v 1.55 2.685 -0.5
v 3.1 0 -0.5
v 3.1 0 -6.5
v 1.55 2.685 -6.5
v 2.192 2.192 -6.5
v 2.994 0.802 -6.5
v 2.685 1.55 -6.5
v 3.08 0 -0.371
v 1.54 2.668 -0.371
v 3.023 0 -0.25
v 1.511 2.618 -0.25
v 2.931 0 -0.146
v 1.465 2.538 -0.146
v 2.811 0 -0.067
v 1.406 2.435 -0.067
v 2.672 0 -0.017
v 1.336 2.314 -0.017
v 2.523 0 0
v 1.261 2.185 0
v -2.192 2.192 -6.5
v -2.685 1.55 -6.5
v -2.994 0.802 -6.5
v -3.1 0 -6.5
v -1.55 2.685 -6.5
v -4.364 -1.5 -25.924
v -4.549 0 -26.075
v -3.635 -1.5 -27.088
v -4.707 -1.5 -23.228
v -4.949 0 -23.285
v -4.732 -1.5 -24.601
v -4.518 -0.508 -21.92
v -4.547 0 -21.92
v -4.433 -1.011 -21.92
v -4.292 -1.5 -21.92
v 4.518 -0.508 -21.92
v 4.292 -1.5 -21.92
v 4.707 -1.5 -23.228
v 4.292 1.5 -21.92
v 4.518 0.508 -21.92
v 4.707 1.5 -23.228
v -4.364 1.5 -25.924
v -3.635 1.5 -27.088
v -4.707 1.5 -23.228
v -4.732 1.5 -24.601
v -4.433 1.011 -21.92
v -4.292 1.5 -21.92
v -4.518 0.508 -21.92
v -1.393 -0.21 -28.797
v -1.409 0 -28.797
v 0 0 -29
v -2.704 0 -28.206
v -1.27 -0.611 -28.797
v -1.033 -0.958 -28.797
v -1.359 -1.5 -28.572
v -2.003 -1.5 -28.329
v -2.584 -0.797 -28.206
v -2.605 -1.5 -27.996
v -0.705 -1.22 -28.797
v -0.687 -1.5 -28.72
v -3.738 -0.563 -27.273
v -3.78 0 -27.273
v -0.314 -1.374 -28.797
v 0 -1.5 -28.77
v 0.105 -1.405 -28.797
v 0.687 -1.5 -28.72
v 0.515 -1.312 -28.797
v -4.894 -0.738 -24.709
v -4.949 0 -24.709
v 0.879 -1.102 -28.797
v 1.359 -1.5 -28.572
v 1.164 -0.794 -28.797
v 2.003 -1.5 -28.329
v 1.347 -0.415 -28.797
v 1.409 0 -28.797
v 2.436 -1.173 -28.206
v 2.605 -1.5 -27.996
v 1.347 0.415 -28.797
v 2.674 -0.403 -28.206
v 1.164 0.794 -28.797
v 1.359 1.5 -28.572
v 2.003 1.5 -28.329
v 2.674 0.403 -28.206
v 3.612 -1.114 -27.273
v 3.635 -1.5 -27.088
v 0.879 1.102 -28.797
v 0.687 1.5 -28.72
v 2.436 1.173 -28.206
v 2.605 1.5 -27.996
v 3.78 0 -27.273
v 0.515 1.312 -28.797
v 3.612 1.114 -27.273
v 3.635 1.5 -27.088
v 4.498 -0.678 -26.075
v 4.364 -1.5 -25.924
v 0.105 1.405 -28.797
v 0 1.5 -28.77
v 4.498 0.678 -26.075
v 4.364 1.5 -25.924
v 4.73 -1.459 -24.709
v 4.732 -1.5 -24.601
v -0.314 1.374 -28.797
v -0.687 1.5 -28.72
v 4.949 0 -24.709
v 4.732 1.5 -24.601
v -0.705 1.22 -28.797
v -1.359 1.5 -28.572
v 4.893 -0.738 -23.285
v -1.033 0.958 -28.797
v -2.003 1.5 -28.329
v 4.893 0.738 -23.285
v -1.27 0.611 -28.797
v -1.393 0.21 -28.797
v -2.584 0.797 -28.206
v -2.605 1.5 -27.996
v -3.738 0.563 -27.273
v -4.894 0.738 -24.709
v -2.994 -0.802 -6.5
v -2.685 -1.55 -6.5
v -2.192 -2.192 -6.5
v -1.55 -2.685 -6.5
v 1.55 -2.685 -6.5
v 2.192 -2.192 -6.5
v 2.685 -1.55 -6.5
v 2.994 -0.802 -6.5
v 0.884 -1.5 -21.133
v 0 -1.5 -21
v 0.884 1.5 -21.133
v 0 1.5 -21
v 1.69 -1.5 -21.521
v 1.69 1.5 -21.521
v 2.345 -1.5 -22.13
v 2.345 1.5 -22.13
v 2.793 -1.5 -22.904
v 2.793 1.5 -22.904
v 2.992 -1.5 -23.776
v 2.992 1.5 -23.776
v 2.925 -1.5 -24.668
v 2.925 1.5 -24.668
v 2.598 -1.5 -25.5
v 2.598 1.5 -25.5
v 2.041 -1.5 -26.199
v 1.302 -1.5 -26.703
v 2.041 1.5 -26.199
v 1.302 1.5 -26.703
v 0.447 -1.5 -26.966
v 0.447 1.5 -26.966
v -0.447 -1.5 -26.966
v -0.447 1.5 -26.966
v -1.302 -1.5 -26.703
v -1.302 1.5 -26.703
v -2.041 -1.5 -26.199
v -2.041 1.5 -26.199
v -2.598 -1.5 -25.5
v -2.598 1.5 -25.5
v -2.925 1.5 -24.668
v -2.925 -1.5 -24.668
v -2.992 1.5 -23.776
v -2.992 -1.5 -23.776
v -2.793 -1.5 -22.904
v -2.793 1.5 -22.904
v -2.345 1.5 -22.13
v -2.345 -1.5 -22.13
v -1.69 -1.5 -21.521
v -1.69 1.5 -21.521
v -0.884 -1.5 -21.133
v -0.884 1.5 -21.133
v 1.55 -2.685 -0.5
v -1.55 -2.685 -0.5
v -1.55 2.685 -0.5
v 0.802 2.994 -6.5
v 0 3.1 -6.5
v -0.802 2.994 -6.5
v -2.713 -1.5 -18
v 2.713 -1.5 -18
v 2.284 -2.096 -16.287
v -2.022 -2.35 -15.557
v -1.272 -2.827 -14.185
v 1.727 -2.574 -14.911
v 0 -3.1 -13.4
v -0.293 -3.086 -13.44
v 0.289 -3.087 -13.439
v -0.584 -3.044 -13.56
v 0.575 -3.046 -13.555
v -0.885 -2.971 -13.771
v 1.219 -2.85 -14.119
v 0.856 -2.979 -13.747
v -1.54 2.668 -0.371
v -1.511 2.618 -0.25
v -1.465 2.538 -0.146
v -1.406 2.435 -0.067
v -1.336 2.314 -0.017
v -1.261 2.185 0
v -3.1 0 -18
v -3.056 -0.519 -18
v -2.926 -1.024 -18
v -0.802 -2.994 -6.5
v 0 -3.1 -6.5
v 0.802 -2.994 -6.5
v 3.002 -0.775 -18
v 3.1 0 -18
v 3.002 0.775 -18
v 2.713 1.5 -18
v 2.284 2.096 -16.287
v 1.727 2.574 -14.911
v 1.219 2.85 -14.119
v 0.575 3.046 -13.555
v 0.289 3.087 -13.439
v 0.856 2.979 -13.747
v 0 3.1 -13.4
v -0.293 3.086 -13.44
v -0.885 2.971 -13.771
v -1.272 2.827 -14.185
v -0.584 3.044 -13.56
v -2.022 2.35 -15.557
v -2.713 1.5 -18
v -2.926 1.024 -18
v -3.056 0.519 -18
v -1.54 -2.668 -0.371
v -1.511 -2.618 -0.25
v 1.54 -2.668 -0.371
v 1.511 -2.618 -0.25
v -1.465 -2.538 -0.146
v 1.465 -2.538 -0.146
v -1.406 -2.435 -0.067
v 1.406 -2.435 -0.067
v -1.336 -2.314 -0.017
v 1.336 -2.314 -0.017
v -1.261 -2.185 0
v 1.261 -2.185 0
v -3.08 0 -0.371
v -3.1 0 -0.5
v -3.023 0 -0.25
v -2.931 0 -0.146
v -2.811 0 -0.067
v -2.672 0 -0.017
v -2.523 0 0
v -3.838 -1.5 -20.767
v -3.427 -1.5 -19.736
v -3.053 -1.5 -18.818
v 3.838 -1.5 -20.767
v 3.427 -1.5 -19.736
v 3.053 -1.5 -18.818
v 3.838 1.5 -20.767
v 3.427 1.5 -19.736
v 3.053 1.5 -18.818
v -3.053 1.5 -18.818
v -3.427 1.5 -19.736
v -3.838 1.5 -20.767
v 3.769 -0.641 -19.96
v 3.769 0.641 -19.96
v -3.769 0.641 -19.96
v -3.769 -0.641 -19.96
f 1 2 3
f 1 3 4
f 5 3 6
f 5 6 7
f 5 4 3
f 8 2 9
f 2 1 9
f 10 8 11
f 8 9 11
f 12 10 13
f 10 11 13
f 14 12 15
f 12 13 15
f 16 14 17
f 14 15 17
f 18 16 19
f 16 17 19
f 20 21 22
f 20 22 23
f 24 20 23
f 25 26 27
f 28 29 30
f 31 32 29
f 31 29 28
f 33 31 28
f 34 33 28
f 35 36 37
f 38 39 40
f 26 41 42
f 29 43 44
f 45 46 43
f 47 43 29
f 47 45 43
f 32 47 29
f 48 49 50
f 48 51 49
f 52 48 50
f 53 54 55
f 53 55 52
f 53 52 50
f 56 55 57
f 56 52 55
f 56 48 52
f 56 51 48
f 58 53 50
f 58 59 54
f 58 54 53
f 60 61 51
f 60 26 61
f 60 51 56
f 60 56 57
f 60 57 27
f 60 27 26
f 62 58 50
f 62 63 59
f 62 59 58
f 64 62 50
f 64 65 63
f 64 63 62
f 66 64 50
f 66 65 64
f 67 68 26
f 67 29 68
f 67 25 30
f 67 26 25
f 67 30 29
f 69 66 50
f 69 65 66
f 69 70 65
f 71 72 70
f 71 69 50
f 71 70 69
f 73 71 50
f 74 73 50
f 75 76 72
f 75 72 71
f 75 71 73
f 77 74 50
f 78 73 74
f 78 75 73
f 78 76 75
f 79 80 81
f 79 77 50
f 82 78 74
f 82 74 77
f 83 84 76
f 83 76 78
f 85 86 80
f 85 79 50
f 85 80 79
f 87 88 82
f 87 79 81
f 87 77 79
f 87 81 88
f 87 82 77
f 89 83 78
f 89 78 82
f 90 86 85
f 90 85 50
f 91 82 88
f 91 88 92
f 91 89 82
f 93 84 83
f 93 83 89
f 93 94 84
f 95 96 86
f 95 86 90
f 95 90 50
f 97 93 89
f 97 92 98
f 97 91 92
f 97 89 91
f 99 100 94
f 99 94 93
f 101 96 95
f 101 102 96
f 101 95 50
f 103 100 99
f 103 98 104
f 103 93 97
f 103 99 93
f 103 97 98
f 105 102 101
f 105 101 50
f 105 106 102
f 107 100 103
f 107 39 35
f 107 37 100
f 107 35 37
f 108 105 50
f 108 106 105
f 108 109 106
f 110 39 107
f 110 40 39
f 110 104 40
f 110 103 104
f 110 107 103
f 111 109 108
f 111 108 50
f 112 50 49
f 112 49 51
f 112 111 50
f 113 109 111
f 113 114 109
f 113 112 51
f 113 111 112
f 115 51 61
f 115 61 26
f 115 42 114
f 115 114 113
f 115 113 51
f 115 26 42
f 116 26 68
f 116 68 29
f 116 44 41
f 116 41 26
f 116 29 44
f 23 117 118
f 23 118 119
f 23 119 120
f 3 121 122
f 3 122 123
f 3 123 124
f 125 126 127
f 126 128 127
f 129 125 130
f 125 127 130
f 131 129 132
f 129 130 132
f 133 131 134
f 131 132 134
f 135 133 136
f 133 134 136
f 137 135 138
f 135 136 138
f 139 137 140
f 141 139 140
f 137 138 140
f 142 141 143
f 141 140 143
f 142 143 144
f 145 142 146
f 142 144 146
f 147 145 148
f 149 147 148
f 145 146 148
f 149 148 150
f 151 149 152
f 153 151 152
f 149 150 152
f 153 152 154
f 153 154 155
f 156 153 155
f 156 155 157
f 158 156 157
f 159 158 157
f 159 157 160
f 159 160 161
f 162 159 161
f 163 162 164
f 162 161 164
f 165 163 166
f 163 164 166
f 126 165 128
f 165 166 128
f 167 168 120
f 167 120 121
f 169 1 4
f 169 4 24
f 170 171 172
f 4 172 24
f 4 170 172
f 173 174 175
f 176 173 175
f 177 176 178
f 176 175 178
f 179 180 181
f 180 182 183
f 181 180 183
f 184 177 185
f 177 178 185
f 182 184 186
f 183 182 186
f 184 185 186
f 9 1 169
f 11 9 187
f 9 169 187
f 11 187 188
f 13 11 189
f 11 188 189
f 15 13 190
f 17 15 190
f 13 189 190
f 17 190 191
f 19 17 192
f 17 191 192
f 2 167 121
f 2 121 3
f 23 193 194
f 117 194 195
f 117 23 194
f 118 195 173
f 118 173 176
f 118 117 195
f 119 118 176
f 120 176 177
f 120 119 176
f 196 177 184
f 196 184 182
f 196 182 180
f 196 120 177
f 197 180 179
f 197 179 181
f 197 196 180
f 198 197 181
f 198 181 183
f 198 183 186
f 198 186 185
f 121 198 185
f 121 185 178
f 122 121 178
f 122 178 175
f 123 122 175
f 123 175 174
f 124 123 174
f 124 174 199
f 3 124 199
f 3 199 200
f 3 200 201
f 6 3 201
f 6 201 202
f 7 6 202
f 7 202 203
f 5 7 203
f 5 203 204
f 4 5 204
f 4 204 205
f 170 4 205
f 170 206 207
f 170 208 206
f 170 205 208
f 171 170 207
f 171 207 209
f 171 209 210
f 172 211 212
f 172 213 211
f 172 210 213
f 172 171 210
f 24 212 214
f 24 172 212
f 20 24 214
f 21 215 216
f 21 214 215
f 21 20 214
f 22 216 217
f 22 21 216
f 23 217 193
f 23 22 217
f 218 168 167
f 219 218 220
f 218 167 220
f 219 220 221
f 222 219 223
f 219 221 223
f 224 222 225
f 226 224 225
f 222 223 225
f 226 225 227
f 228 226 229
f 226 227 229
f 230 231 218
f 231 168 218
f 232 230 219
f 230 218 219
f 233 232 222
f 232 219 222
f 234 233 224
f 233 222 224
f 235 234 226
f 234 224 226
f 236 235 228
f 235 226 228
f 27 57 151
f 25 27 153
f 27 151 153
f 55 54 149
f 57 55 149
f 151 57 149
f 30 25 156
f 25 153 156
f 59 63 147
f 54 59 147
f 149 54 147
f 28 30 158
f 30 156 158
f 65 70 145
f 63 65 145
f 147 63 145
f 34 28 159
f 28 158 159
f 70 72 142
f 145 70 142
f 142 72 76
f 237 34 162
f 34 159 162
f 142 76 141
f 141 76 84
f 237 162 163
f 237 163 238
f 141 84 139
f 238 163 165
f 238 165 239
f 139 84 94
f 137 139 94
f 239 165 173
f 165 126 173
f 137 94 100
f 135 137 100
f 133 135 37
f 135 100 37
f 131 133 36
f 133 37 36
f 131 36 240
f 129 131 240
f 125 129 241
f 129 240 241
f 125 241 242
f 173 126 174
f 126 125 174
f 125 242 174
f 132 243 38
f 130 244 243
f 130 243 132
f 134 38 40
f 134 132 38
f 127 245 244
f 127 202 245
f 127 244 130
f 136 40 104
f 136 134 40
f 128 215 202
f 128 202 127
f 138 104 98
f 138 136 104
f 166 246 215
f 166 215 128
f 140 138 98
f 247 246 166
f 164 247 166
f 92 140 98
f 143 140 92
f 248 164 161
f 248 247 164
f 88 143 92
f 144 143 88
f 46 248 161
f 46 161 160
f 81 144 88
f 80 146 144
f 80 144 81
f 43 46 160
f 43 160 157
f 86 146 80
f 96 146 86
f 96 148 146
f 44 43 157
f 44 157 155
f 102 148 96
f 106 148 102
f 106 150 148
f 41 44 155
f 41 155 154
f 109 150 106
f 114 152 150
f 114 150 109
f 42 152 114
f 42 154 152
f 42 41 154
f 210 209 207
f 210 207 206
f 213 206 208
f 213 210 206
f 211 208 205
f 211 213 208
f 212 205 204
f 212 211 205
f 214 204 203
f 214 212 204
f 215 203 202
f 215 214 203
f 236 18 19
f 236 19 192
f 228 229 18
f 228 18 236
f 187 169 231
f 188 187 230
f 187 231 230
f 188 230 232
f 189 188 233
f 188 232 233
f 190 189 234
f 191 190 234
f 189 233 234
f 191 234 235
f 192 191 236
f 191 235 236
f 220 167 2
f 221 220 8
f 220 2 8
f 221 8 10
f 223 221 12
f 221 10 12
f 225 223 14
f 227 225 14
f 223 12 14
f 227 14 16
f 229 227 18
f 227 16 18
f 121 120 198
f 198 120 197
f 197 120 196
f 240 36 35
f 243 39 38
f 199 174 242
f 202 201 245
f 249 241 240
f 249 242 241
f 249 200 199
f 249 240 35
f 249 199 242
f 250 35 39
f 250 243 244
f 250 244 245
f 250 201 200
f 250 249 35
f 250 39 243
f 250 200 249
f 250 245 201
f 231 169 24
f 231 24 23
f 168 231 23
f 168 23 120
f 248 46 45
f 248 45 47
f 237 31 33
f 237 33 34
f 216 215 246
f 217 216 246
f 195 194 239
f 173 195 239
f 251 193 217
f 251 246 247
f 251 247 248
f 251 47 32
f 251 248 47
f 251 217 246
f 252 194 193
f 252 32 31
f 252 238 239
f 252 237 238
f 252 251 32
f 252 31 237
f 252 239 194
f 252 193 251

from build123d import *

# Parameters (mm, degrees)
CUT_EXTRUDE2_DEPTH = 6
SKETCH4_OUTSIDE_W  = 18.26
SKETCH4_OUTSIDE_H  = 14.46
CUT_EXTRUDE3_DEPTH = 6.5
FILLET1_R          = 0.5
CUT_EXTRUDE4_START = -1.5
SKETCH5_R          = 3
CUT_EXTRUDE4_DEPTH = 1.5


with BuildPart() as part:
    # Sketch1 → Revolve1 (revolve)
    with BuildSketch(Plane(origin=(0, 0, 0), x_dir=(1, 0, 0), z_dir=(0, 1, 0))):
        with BuildLine():
            ThreePointArc((0, 29), (-4.207271262, 26.701641821), (-4.546615997, 21.919547411))
            Line((-4.546615997, 21.919547411), (-3.1, 18))
            Line((-3.1, 18), (-3.1, 0))
            Line((-3.1, 0), (0, 0))
            Line((0, 0), (0, 29))
        make_face()
    revolve(axis=Axis((0, 0, -29), (0, 0, 1)))

    # Sketch2 → Cut-Extrude2 (cut, symmetric)
    with BuildSketch(Plane(origin=(0, 0, 0), x_dir=(0, 0, -1), z_dir=(1, 0, 0))):
        with BuildLine():
            Line((18, 1.5), (28.769696007, 1.5))
            ThreePointArc((28.769696007, 1.5), (26.031864858, 4.56853644), (21.919547411, 4.546615997))
            Line((21.919547411, 4.546615997), (18, 3.1))
            Line((18, 3.1), (13.400256656, 3.1))
            Line((13.400256656, 3.1), (18, 1.5))
        make_face()
        with BuildLine():
            ThreePointArc((21.919547411, -4.546615997), (26.031864858, -4.56853644), (28.769696007, -1.5))
            Line((28.769696007, -1.5), (18, -1.5))
            Line((18, -1.5), (13.400256656, -3.1))
            Line((13.400256656, -3.1), (18, -3.1))
            Line((18, -3.1), (21.919547411, -4.546615997))
        make_face()
    extrude(amount=CUT_EXTRUDE2_DEPTH, both=True, mode=Mode.SUBTRACT)

    # Sketch4 outside → Cut-Extrude3 (cut)
    with BuildSketch(Plane.XY):
        Rectangle(SKETCH4_OUTSIDE_W, SKETCH4_OUTSIDE_H)
        Polygon((1.55, 2.684678752), (-1.55, 2.684678752), (-3.1, 0), (-1.55, -2.684678752), (1.55, -2.684678752), (3.1, 0), align=None, mode=Mode.SUBTRACT)
    extrude(amount=-CUT_EXTRUDE3_DEPTH, mode=Mode.SUBTRACT)

    # Fillet1
    fillet1_edges = [part.edges().sort_by_distance(p)[0] for p in [
        (2.325, 1.342339376, 0),
        (2.325, -1.342339376, 0),
        (0, -2.684678752, 0),
        (-2.325, -1.342339376, 0),
        (-2.325, 1.342339376, 0),
        (0, 2.684678752, 0),
    ]]
    fillet(fillet1_edges, radius=FILLET1_R)

    # Sketch5 → Cut-Extrude4 (cut, symmetric)
    with BuildSketch(Plane(origin=(0, 1.5, 0), x_dir=(1, 0, 0), z_dir=(0, 1, 0)).offset(CUT_EXTRUDE4_START)):
        with Locations(Location((0, 24, 0), (0, 0, 270))):
            Circle(SKETCH5_R)
    extrude(amount=CUT_EXTRUDE4_DEPTH, both=True, mode=Mode.SUBTRACT)


solid = part.part
